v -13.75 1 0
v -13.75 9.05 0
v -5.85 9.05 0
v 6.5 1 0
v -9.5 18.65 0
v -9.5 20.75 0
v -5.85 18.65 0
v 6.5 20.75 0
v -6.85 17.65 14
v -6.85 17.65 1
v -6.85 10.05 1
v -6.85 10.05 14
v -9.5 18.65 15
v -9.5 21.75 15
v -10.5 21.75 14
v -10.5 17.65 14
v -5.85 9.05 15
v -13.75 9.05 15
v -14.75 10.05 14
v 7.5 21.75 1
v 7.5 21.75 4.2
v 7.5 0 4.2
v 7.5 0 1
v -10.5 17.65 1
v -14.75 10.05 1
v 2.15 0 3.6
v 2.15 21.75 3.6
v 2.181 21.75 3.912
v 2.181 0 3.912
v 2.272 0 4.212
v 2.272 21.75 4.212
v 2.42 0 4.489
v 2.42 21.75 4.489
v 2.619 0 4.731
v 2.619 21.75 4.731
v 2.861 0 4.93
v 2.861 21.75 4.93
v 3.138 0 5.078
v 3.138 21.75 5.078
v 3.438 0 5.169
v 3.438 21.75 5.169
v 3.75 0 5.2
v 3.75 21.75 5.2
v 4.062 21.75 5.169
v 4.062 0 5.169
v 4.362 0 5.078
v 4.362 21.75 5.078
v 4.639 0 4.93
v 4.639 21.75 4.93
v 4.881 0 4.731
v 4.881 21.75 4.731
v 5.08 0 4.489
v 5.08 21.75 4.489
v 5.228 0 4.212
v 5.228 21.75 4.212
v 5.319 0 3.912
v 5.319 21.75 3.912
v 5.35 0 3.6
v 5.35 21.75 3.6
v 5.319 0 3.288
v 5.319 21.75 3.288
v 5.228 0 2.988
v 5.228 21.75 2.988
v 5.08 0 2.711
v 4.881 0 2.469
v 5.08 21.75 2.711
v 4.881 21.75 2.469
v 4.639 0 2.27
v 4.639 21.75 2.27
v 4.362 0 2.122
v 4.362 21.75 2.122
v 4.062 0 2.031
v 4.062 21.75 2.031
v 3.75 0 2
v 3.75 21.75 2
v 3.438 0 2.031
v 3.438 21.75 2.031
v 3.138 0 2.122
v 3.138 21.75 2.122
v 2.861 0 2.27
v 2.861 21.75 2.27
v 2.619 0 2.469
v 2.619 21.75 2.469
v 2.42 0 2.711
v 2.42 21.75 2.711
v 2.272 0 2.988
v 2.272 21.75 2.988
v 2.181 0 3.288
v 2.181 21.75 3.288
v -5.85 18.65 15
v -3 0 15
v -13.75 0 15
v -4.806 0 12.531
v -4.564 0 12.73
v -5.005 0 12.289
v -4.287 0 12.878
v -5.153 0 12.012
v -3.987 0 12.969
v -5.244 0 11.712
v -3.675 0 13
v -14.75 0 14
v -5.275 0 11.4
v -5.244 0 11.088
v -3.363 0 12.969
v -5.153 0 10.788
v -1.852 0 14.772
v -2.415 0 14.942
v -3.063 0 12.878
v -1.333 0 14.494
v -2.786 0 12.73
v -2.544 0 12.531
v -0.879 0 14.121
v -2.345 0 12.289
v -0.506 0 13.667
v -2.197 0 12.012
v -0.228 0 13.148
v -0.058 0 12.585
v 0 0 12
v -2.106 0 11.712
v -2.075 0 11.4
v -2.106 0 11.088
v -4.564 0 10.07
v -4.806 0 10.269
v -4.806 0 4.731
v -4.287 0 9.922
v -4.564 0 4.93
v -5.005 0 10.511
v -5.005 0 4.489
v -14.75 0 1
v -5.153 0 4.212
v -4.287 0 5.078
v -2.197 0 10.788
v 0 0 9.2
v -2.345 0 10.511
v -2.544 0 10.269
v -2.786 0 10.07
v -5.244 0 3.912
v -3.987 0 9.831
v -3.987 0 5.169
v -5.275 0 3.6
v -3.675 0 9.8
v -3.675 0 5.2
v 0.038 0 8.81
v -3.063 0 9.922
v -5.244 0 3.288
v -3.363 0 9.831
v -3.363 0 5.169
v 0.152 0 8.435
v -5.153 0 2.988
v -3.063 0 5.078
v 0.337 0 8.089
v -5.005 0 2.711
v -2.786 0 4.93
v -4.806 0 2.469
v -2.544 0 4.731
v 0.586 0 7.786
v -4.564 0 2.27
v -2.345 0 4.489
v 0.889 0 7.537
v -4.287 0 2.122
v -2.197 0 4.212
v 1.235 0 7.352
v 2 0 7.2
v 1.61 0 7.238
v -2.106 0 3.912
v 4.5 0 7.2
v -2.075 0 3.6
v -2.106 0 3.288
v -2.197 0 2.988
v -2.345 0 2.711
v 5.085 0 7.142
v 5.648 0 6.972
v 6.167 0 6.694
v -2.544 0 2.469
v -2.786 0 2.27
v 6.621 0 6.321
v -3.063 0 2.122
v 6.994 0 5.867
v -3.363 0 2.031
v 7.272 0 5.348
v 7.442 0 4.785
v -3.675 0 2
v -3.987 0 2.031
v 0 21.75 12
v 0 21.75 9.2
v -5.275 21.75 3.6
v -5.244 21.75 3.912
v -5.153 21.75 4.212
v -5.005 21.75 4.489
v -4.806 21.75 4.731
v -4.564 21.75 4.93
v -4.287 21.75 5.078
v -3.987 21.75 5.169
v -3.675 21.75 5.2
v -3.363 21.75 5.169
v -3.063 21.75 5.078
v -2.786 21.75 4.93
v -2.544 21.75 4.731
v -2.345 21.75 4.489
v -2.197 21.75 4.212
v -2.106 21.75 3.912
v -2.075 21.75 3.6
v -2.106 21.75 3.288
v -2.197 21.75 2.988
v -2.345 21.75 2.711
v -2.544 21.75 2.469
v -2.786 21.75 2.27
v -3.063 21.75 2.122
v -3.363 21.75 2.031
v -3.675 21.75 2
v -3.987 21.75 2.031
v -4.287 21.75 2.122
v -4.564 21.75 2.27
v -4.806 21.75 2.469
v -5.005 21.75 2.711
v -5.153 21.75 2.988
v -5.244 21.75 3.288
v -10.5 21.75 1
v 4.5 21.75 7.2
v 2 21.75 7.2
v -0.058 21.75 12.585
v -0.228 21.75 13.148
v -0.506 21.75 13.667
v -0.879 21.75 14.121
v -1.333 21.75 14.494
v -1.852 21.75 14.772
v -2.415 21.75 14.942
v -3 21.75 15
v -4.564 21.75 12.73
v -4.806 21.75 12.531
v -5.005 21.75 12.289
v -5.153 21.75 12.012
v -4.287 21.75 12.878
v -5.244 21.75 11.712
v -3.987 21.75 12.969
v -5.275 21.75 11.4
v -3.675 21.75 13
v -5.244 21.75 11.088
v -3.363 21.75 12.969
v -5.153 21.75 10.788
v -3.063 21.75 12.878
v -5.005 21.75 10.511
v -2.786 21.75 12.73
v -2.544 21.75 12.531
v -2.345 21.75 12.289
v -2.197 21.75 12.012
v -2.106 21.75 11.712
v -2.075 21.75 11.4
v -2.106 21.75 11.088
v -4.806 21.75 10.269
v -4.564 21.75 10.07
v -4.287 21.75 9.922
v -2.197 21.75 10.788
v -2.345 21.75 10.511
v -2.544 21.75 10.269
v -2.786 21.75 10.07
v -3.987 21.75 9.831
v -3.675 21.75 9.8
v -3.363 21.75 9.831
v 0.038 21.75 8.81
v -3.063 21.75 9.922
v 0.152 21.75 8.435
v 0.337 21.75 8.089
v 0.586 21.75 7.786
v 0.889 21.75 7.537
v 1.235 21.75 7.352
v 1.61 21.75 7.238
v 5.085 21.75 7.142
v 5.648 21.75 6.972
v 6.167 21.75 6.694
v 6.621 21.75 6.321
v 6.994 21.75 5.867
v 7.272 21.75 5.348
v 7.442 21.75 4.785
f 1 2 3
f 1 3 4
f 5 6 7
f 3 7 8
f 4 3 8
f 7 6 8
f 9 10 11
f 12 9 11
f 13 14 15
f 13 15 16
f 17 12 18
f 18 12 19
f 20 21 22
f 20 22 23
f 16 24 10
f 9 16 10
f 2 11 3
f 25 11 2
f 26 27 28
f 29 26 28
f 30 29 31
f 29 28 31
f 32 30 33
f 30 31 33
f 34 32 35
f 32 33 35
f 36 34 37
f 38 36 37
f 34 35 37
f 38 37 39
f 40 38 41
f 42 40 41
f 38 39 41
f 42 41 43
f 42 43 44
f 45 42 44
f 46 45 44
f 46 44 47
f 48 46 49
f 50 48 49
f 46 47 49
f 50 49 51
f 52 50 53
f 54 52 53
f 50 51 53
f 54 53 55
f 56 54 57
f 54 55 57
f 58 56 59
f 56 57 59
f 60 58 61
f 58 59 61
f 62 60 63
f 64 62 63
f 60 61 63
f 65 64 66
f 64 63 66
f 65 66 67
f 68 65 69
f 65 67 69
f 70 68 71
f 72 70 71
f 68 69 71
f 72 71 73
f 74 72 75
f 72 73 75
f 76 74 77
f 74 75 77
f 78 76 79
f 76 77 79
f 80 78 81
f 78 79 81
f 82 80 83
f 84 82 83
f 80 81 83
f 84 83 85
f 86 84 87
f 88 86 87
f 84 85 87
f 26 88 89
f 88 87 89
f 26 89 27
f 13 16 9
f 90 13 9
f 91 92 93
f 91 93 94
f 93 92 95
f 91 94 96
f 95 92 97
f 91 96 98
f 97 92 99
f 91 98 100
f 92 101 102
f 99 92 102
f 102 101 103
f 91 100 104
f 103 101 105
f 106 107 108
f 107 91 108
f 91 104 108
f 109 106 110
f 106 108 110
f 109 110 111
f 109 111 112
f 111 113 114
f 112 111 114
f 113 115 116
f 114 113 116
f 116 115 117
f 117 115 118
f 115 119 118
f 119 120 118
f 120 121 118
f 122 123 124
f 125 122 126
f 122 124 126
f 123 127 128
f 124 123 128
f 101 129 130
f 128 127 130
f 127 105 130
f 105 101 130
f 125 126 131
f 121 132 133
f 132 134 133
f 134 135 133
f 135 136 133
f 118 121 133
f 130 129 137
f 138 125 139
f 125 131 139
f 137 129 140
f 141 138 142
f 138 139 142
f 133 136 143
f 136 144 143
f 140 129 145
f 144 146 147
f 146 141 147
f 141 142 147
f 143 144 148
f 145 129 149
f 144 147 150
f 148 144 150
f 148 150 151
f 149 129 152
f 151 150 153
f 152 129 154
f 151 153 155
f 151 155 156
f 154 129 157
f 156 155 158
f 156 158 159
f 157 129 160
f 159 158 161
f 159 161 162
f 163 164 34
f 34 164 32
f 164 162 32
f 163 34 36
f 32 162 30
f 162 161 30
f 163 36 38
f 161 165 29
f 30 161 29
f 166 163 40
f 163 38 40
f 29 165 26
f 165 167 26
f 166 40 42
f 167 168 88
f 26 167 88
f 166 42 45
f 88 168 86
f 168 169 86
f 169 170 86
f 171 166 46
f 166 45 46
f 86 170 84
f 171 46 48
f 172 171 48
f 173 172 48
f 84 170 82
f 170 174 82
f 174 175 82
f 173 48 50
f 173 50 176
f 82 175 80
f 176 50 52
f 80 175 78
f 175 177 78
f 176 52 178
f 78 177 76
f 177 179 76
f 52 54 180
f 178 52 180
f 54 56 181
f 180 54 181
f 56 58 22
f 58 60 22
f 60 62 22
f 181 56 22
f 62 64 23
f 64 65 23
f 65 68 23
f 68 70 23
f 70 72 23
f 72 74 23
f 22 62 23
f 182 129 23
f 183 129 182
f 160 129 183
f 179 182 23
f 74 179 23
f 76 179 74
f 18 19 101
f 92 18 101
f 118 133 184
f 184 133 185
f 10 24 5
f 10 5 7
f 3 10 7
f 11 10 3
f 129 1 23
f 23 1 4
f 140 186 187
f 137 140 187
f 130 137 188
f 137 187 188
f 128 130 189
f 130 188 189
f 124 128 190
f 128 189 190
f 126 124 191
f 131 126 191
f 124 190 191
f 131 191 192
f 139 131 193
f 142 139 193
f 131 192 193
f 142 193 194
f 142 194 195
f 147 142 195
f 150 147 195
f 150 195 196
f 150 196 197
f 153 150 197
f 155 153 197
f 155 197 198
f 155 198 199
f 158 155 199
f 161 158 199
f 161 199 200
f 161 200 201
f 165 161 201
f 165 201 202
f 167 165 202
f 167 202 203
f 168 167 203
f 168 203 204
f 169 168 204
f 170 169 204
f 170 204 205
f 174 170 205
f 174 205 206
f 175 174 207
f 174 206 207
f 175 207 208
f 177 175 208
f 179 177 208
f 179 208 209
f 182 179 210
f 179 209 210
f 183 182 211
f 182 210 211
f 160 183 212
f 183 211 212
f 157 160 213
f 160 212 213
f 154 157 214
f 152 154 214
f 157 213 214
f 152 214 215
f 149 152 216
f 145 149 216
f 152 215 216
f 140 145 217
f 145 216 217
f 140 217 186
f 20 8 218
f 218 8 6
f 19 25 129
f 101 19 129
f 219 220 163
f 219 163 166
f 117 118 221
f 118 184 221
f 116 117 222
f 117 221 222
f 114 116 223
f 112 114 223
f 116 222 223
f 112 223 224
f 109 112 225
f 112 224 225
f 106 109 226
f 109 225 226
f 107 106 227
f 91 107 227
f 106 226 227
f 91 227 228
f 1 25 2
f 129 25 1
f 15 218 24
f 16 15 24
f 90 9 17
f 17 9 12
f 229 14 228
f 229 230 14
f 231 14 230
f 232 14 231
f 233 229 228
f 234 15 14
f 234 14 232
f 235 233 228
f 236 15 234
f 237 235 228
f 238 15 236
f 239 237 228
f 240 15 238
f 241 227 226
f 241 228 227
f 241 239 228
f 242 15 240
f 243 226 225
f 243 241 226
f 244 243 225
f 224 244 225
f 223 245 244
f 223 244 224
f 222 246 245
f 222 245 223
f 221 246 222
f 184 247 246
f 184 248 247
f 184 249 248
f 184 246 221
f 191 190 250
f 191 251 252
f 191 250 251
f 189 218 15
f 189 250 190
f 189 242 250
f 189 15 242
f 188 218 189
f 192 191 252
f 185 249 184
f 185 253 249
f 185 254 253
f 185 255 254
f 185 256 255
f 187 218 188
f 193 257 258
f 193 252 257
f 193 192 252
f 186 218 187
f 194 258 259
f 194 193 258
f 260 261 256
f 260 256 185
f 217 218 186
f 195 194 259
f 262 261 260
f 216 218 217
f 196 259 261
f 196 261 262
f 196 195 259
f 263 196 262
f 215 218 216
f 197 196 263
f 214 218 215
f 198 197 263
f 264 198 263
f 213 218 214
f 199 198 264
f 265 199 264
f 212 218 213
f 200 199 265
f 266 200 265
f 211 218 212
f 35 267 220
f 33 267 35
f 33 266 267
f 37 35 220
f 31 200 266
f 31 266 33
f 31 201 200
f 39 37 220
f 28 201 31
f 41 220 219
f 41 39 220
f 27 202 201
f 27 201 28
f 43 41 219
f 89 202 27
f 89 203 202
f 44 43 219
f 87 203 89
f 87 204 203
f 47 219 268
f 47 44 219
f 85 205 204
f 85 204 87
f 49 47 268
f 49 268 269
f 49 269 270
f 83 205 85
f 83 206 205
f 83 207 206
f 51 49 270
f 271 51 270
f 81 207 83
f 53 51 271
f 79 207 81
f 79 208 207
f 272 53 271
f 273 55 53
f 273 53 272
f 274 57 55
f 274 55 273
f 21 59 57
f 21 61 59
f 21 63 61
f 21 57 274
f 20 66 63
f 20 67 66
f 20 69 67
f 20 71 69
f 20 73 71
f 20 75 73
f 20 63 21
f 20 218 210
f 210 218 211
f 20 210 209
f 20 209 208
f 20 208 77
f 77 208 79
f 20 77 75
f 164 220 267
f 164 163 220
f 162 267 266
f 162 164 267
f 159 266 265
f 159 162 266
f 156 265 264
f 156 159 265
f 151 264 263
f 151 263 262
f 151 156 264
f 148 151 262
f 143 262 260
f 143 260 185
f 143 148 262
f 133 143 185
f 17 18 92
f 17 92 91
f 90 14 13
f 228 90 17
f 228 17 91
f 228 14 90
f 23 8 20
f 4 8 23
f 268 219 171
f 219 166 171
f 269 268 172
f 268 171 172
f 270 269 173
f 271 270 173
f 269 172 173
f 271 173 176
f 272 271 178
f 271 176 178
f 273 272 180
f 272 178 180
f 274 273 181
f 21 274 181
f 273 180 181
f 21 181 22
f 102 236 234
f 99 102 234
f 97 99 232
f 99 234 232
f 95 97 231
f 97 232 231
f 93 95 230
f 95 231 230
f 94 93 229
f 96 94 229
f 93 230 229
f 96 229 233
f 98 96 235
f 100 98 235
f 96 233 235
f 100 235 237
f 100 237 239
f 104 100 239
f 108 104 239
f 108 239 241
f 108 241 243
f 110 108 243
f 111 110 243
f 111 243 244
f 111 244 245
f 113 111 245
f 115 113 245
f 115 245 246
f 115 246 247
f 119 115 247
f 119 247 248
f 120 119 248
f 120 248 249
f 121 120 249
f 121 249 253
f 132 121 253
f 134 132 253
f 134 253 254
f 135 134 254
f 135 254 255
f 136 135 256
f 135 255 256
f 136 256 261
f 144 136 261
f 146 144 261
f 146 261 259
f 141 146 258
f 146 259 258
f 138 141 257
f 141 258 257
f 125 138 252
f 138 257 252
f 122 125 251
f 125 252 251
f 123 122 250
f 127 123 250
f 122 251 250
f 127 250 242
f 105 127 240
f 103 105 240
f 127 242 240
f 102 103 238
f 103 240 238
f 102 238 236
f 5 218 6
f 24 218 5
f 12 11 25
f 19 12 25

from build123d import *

# Parameters (mm, degrees)
RESSALTO_EXTRUS_O1_DEPTH = 15
CORTE_EXTRUS_O1_REACH    = 32.259
ESBO_O2_R                = 1.6
ESBO_O3_W                = 7.5
ESBO_O3_H                = 7.2
ESBO_O3_R                = 1.6
RESSALTO_EXTRUS_O2_DEPTH = 21.75
FILETE1_R                = 2
FILETE2_R                = 3
CHANFRO1_SIZE            = 1
CHANFRO2_SIZE            = 1


with BuildPart() as part:
    # Esboço1 → Ressalto-extrusão1 (new body)
    with BuildSketch(Plane.XY):
        Polygon((0, 0), (0, 21.75), (-10.5, 21.75), (-10.5, 17.65), (-6.85, 17.65), (-6.85, 10.05), (-14.75, 10.05), (-14.75, 0), align=None)
    extrude(amount=RESSALTO_EXTRUS_O1_DEPTH)

    # Esboço2 → Corte-extrusão1 (cut, up to next)
    with BuildSketch(Plane(origin=(0, 21.75, 0), x_dir=(1, 0, 0), z_dir=(0, 1, 0)), mode=Mode.PRIVATE) as corte_extrus_o1_sk1:
        with Locations(Location((-3.675, -3.6, 0), (0, 0, 180))):
            Circle(ESBO_O2_R)
    corte_extrus_o1_tool1 = extrude(corte_extrus_o1_sk1.sketch, amount=-CORTE_EXTRUS_O1_REACH, mode=Mode.PRIVATE) & part.part
    # Esboço2 → Corte-extrusão1 (cut, up to next)
    with BuildSketch(Plane(origin=(0, 21.75, 0), x_dir=(1, 0, 0), z_dir=(0, 1, 0)), mode=Mode.PRIVATE) as corte_extrus_o1_sk2:
        with Locations(Location((-3.675, -11.4, 0), (0, 0, 180))):
            Circle(ESBO_O2_R)
    corte_extrus_o1_tool2 = extrude(corte_extrus_o1_sk2.sketch, amount=-CORTE_EXTRUS_O1_REACH, mode=Mode.PRIVATE) & part.part
    add(corte_extrus_o1_tool1.solids().sort_by_distance((-3.675, 21.75, 3.6))[0], mode=Mode.SUBTRACT)
    add(corte_extrus_o1_tool2.solids().sort_by_distance((-3.675, 21.75, 11.4))[0], mode=Mode.SUBTRACT)

    # Esboço3 → Ressalto-extrusão2 (add)
    with BuildSketch(Plane(origin=(0, 21.75, 0), x_dir=(1, 0, 0), z_dir=(0, 1, 0))):
        with Locations((3.75, -3.6)):
            Rectangle(ESBO_O3_W, ESBO_O3_H)
        with Locations(Location((3.75, -3.6, 0), (0, 0, 180))):
            Circle(ESBO_O3_R, mode=Mode.SUBTRACT)
    extrude(amount=-RESSALTO_EXTRUS_O2_DEPTH)

    # Filete1
    filete1_edges = [part.edges().sort_by_distance(p)[0] for p in [
        (0, 10.875, 7.2),
    ]]
    fillet(filete1_edges, radius=FILETE1_R)

    # Filete2
    filete2_edges = [part.edges().sort_by_distance(p)[0] for p in [
        (7.5, 10.875, 7.2),
        (0, 10.875, 15),
    ]]
    fillet(filete2_edges, radius=FILETE2_R)

    # Chanfro1
    chanfro1_edges = [part.edges().sort_by_distance(p)[0] for p in [
        (-3.625, 0, 0),
        (7.5, 10.875, 0),
        (-14.75, 5.025, 0),
        (-10.8, 10.05, 0),
        (-6.85, 13.85, 0),
        (-8.675, 17.65, 0),
        (-10.5, 19.7, 0),
        (-1.5, 21.75, 0),
    ]]
    chamfer(chanfro1_edges, length=CHANFRO1_SIZE)

    # Chanfro2
    chanfro2_edges = [part.edges().sort_by_distance(p)[0] for p in [
        (-10.5, 19.7, 15),
        (-8.675, 17.65, 15),
        (-6.85, 13.85, 15),
        (-10.8, 10.05, 15),
        (-14.75, 5.025, 15),
    ]]
    chamfer(chanfro2_edges, length=CHANFRO2_SIZE)


solid = part.part
